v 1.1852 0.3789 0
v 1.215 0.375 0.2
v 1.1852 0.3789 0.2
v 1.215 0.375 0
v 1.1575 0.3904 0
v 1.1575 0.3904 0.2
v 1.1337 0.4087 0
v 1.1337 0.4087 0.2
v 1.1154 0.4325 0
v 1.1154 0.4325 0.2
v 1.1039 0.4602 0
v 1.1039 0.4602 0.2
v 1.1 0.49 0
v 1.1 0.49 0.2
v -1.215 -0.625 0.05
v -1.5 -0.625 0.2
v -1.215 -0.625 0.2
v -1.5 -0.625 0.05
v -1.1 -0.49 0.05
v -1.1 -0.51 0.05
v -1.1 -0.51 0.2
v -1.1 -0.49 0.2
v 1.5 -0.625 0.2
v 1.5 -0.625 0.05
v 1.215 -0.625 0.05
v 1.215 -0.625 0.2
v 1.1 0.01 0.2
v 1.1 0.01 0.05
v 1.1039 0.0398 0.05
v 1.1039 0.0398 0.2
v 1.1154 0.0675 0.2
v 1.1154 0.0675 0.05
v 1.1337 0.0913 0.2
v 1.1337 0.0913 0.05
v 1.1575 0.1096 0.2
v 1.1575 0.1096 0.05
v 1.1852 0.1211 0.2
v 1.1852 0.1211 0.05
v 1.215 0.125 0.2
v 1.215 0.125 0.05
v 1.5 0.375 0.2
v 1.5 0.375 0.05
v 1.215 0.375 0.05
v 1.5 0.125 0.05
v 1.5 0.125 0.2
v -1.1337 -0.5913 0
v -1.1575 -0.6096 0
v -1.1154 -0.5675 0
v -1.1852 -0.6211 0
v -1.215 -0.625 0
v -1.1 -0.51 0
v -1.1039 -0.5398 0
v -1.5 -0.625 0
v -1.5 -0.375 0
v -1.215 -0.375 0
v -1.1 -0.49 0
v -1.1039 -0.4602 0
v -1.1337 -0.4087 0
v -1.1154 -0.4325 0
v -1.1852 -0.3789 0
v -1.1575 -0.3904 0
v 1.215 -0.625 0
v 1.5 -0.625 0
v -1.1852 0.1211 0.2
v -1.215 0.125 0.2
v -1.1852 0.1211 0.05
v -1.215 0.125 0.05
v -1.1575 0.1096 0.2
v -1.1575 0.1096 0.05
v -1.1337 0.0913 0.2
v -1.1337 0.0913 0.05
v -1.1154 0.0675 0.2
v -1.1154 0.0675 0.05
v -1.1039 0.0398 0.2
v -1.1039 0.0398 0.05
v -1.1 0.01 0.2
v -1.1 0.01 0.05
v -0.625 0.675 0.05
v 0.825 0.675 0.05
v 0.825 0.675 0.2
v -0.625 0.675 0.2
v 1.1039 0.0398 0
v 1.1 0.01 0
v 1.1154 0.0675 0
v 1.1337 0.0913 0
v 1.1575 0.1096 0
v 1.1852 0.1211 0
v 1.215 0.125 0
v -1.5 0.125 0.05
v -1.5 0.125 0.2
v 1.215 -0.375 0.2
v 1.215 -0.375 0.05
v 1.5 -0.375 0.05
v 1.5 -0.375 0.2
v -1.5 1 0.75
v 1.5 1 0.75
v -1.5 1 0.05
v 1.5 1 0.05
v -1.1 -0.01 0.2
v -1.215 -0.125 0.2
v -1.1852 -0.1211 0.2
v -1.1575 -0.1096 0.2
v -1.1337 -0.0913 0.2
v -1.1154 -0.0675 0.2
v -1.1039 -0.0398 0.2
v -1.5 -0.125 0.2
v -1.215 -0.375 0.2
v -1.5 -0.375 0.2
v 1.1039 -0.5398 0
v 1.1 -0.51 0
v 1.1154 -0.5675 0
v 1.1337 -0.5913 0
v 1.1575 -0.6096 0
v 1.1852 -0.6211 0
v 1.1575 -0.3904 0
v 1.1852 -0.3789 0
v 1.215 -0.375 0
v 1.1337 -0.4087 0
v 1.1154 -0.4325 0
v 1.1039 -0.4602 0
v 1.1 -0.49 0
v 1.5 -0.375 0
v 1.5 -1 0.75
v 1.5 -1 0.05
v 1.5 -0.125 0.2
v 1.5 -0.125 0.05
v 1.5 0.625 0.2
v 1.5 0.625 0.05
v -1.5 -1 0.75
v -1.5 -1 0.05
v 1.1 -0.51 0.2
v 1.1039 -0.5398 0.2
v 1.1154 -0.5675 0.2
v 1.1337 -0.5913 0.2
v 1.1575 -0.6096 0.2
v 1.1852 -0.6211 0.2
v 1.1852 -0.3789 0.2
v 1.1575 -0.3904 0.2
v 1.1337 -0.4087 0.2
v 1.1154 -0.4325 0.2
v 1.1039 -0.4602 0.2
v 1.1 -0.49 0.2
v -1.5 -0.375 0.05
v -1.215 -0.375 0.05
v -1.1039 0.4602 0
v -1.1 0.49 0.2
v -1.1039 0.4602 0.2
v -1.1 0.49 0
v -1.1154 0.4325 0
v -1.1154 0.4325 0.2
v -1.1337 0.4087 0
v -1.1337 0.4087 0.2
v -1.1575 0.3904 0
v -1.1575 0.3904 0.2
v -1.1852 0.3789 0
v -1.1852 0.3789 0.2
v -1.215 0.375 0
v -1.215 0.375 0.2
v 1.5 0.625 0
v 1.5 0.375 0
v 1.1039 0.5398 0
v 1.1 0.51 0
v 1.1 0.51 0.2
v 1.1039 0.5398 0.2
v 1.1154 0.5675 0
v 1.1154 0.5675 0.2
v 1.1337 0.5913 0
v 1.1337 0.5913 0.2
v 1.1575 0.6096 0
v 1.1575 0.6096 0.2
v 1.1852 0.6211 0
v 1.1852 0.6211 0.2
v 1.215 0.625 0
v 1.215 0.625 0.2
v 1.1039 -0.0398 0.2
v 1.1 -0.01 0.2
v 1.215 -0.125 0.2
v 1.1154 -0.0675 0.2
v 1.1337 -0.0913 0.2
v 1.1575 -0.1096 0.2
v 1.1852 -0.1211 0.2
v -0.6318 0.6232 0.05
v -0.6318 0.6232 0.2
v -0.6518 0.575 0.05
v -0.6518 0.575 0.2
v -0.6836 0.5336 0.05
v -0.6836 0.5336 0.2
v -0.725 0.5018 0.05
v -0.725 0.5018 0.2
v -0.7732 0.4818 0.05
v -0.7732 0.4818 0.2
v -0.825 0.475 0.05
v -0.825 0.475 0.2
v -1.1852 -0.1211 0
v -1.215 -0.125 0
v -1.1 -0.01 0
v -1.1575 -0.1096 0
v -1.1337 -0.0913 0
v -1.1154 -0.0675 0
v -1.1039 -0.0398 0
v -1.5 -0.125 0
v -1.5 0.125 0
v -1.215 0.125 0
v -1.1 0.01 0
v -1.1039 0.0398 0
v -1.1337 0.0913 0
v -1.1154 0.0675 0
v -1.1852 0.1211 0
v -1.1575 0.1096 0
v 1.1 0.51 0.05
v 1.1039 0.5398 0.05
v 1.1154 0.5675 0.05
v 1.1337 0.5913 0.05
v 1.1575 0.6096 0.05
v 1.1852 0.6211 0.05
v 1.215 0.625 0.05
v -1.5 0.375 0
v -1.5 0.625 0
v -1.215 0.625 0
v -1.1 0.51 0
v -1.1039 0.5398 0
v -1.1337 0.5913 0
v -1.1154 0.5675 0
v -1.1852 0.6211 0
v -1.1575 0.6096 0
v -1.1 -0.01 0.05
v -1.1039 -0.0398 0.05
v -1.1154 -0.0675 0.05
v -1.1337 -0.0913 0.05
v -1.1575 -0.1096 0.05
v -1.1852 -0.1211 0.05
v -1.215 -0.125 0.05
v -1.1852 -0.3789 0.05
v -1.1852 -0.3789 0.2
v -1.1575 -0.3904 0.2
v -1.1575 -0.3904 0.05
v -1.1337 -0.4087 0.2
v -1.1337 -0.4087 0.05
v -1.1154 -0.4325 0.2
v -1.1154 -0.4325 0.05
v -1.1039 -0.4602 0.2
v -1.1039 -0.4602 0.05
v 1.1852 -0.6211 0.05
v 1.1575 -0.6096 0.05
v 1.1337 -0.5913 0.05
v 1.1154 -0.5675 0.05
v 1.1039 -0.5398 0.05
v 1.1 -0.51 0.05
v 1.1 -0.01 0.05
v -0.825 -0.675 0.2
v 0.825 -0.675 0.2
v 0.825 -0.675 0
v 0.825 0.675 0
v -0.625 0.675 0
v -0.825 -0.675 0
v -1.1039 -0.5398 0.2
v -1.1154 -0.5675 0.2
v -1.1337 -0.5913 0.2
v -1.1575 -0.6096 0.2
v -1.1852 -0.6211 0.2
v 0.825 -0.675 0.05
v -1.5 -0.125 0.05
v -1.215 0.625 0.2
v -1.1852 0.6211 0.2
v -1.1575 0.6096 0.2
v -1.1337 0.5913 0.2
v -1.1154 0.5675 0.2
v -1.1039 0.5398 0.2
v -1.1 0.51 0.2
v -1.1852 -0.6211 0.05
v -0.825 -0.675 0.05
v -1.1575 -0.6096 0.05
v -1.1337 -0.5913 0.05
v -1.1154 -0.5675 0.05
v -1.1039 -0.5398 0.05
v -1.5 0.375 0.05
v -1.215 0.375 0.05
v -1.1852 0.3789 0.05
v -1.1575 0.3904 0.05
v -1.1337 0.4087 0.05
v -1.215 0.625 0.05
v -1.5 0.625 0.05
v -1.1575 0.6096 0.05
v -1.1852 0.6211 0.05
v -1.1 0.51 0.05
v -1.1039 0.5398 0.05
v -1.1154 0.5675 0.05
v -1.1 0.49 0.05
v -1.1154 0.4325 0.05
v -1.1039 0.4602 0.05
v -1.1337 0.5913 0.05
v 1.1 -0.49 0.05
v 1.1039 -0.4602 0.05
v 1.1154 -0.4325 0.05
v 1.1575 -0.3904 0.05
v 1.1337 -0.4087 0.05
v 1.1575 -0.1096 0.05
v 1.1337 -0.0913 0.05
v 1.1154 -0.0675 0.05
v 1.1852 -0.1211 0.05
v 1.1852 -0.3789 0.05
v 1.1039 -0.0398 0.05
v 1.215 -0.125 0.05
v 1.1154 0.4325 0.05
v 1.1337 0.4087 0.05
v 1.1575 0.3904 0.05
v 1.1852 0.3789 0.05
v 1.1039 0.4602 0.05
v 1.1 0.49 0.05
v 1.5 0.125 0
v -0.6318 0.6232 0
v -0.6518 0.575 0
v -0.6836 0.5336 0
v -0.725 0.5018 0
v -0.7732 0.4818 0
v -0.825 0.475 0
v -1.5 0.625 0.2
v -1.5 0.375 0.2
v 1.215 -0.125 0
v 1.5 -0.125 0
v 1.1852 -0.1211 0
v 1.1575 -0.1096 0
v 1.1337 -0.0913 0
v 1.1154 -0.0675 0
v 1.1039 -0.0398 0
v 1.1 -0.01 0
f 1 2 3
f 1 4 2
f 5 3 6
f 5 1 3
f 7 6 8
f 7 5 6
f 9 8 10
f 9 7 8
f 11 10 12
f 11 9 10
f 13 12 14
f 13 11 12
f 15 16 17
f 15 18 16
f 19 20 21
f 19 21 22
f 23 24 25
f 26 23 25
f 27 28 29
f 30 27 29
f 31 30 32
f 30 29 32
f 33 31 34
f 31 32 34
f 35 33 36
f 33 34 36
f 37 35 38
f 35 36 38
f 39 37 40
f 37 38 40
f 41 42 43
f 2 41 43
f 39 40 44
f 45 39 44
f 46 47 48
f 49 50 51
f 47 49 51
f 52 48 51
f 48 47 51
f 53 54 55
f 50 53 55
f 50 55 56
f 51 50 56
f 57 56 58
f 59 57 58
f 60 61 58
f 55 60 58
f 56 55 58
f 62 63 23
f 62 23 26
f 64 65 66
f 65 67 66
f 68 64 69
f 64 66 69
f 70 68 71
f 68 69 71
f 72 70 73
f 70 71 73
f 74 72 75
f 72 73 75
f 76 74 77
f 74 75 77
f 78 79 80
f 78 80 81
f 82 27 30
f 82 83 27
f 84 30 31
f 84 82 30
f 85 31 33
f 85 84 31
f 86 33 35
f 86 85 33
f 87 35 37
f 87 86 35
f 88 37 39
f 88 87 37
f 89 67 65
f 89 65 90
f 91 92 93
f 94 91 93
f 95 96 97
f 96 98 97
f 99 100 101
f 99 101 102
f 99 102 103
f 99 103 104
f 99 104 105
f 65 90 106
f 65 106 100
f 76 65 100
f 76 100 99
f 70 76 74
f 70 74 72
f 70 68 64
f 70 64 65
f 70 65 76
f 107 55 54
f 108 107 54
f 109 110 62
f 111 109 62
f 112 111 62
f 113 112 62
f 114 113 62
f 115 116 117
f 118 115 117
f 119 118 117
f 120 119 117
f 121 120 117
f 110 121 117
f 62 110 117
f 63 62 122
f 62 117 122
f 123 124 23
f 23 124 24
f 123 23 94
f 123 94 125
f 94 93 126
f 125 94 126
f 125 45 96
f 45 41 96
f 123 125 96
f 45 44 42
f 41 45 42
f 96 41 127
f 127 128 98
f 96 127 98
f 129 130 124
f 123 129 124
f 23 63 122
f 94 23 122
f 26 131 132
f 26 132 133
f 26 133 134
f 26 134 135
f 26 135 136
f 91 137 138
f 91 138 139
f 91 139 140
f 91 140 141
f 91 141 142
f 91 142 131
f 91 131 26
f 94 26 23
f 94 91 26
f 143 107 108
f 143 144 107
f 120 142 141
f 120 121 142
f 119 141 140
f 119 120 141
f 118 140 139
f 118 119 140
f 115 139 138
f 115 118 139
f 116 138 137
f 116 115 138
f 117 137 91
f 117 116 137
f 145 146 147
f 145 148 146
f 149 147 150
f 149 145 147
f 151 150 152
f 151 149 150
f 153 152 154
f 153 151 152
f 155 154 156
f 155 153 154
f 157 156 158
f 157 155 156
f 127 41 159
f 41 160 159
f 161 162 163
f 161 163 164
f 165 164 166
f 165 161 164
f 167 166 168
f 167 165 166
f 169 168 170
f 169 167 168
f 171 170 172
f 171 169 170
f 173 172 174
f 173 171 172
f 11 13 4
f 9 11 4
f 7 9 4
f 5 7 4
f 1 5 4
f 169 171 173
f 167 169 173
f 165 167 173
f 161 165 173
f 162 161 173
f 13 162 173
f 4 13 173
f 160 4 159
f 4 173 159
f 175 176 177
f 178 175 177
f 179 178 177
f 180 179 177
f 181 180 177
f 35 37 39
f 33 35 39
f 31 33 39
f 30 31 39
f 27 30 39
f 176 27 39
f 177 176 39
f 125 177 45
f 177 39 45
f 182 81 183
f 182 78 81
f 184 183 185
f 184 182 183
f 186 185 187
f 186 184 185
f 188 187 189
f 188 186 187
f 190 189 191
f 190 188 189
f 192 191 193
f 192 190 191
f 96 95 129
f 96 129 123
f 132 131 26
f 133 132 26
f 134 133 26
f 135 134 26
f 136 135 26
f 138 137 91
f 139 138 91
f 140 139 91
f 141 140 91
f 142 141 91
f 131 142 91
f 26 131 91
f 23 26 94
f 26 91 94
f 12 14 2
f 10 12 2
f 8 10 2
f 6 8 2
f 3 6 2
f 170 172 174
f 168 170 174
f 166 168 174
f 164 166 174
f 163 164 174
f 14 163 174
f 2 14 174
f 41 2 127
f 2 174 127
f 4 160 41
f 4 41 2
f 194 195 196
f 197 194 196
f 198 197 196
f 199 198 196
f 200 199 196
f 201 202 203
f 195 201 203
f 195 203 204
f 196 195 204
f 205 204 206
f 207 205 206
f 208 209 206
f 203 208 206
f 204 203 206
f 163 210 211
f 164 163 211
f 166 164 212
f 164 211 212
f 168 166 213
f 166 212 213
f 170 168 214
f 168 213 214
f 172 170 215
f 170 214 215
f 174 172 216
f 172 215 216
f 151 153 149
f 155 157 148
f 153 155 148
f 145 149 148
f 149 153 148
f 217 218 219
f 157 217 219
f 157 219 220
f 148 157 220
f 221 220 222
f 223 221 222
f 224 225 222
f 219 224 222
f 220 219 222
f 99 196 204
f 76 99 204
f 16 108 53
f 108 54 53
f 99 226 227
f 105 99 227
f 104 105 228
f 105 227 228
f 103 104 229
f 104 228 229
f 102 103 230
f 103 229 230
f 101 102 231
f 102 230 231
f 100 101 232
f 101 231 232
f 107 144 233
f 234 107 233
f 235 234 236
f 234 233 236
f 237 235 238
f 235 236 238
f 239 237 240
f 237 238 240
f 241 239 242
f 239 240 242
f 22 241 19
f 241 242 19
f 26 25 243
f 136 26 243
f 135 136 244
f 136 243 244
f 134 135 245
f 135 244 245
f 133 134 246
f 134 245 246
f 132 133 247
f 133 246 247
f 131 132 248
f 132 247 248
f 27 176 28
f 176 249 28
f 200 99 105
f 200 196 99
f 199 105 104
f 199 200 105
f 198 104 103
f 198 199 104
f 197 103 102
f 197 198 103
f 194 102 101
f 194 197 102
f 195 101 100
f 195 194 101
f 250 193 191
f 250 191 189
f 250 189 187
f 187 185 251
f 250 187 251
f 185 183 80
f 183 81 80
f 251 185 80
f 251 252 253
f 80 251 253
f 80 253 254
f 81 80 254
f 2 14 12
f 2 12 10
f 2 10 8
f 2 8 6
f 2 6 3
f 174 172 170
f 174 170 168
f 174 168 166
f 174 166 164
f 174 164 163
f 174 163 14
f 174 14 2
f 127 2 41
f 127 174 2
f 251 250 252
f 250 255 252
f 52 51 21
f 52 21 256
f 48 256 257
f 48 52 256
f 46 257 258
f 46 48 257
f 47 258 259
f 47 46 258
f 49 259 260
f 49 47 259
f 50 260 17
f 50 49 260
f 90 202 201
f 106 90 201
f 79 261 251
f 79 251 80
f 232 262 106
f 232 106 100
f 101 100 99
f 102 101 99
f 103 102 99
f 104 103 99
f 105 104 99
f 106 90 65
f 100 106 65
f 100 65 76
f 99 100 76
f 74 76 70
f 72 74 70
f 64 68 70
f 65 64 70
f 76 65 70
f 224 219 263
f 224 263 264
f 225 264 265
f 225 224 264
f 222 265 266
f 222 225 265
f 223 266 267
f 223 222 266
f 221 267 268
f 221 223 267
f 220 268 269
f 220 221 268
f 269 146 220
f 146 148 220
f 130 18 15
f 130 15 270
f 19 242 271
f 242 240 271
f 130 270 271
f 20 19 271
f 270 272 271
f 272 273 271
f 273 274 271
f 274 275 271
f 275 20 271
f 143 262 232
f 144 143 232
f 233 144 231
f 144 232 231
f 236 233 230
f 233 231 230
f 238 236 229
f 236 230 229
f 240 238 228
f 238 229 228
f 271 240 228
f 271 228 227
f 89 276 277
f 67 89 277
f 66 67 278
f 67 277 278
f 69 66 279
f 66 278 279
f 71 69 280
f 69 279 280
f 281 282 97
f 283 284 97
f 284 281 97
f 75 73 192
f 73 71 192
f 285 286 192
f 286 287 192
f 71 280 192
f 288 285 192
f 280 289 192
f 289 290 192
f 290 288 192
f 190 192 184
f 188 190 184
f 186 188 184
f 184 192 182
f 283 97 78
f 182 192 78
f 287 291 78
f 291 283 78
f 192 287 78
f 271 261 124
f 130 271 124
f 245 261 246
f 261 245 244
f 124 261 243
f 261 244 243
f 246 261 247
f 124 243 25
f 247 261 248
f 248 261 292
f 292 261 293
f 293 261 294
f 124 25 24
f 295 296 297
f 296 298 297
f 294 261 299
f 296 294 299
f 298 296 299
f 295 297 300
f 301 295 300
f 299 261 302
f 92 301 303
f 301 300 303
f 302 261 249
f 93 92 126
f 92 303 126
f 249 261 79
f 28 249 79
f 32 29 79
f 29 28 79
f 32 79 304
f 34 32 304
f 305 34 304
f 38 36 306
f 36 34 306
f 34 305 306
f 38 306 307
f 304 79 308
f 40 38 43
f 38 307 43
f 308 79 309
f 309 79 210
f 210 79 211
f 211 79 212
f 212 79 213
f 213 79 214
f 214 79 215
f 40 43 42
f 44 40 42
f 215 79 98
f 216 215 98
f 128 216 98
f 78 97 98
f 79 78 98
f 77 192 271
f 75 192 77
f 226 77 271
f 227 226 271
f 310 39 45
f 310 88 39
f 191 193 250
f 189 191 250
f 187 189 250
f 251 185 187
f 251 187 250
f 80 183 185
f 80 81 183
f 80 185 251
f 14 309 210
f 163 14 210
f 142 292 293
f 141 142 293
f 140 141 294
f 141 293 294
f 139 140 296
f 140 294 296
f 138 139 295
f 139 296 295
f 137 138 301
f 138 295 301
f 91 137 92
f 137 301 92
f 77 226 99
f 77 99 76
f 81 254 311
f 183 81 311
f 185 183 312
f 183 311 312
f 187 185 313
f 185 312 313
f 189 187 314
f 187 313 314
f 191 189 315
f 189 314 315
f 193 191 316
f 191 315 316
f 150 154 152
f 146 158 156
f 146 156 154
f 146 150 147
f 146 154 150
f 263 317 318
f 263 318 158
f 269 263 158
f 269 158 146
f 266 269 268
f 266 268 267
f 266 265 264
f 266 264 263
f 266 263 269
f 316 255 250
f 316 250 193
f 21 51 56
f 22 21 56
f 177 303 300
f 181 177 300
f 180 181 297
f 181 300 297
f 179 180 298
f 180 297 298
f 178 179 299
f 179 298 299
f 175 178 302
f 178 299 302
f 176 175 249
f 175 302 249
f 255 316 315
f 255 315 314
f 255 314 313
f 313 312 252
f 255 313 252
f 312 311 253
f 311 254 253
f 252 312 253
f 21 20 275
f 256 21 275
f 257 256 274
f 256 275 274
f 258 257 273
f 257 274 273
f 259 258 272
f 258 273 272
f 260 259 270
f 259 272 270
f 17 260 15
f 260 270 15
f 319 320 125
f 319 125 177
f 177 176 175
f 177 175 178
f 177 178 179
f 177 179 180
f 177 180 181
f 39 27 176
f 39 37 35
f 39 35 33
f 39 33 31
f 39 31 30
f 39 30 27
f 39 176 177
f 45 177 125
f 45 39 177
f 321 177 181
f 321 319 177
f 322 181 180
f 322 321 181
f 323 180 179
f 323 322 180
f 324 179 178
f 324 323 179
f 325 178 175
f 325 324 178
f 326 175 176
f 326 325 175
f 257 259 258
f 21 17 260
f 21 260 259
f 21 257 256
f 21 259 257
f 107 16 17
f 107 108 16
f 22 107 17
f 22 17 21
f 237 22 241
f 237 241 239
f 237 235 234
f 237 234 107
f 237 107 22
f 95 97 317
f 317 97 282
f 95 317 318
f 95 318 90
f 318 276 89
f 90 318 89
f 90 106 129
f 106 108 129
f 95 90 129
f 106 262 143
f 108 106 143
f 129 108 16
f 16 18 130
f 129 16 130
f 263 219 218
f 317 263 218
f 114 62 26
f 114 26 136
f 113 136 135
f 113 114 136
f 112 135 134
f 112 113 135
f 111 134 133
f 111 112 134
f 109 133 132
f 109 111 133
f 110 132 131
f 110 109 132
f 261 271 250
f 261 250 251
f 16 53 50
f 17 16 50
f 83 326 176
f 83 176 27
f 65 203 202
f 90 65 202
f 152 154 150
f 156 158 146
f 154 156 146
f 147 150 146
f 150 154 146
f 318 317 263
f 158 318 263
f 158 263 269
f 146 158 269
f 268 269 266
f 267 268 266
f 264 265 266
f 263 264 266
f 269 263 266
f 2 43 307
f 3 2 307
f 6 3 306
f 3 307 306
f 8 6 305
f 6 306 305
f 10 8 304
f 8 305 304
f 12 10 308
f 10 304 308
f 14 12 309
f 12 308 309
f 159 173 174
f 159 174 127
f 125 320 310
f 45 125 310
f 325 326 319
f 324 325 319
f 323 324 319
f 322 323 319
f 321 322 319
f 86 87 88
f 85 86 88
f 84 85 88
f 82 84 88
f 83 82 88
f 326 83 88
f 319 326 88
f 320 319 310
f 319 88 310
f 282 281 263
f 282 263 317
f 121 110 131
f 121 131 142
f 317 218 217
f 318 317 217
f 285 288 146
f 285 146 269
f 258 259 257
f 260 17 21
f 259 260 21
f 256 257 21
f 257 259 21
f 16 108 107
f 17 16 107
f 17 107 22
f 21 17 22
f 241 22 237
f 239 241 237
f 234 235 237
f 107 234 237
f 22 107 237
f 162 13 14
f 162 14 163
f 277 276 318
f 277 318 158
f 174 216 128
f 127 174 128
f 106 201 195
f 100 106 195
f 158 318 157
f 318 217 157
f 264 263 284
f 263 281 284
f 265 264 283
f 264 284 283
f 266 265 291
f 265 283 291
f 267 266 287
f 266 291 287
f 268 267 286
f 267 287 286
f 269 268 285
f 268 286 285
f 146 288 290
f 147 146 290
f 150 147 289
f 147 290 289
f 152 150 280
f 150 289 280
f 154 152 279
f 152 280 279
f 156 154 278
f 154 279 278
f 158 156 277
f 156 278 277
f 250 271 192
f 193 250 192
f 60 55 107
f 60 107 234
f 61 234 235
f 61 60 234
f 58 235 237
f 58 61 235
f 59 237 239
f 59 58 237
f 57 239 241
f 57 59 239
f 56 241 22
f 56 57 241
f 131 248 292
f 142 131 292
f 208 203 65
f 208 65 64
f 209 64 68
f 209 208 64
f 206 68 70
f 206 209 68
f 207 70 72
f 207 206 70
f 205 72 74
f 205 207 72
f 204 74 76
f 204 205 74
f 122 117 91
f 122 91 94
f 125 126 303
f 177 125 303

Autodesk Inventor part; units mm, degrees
sketch "Sketch1" plane through (0, 0, 0) normal (0, 0, 1) x (1, 0, 0)
  line L0 (-1.5, -1) -> (1.5, -1)
  line L1 (1.5, -1) -> (1.5, 1)
  line L2 (1.5, 1) -> (-1.5, 1)
  line L3 (-1.5, 1) -> (-1.5, -1)
  line L4 (-1.5, -1) -> (1.5, 1) construction
  line L5 (1.5, -1) -> (-1.5, 1) construction
  line L6 (-1.5, 0.375) -> (-1.215, 0.375)
  line L7 (-1.1, 0.49) -> (-1.1, 0.51)
  line L8 (-1.215, 0.625) -> (-1.5, 0.625)
  line L9 (-1.5, 0.625) -> (-1.5, 0.375)
  line L10 (-1.5, 0.375) -> (-1.1, 0.625) construction
  line L11 (-1.1, 0.375) -> (-1.5, 0.625) construction
  arc A0 (-1.215, 0.375) -> (-1.1, 0.49) centre (-1.215, 0.49) ccw
  arc A1 (-1.1, 0.51) -> (-1.215, 0.625) centre (-1.215, 0.51) ccw
  line L12 (0, 1) -> (0, -1) construction
  line L13 (1.5, 0.375) -> (1.215, 0.375)
  line L14 (1.1, 0.49) -> (1.1, 0.51)
  line L15 (1.215, 0.625) -> (1.5, 0.625)
  line L16 (1.5, 0.625) -> (1.5, 0.375)
  arc A2 (1.1, 0.49) -> (1.215, 0.375) centre (1.215, 0.49) ccw
  arc A3 (1.215, 0.625) -> (1.1, 0.51) centre (1.215, 0.51) ccw
  line L17 (-1.5, 0.125) -> (-1.5, -0.125)
  line L18 (-1.215, 0.125) -> (-1.5, 0.125)
  arc A4 (-1.1, 0.01) -> (-1.215, 0.125) centre (-1.215, 0.01) ccw
  arc A5 (-1.215, -0.125) -> (-1.1, -0.01) centre (-1.215, -0.01) ccw
  line L19 (-1.1, -0.01) -> (-1.1, 0.01)
  line L20 (-1.5, -0.125) -> (-1.215, -0.125)
  line L21 (1.5, 0.125) -> (1.5, -0.125)
  line L22 (1.5, -0.125) -> (1.215, -0.125)
  line L23 (1.215, 0.125) -> (1.5, 0.125)
  arc A6 (1.1, -0.01) -> (1.215, -0.125) centre (1.215, -0.01) ccw
  line L24 (1.1, -0.01) -> (1.1, 0.01)
  arc A7 (1.215, 0.125) -> (1.1, 0.01) centre (1.215, 0.01) ccw
  line L25 (-1.5, -0.375) -> (-1.5, -0.625)
  line L26 (-1.215, -0.375) -> (-1.5, -0.375)
  arc A8 (-1.1, -0.49) -> (-1.215, -0.375) centre (-1.215, -0.49) ccw
  arc A9 (-1.215, -0.625) -> (-1.1, -0.51) centre (-1.215, -0.51) ccw
  line L27 (-1.1, -0.51) -> (-1.1, -0.49)
  line L28 (-1.5, -0.625) -> (-1.215, -0.625)
  line L29 (1.5, -0.375) -> (1.5, -0.625)
  line L30 (1.5, -0.625) -> (1.215, -0.625)
  line L31 (1.215, -0.375) -> (1.5, -0.375)
  arc A10 (1.1, -0.51) -> (1.215, -0.625) centre (1.215, -0.51) ccw
  line L32 (1.1, -0.51) -> (1.1, -0.49)
  arc A11 (1.215, -0.375) -> (1.1, -0.49) centre (1.215, -0.49) ccw
  line L33 (-0.825, -0.675) -> (0.825, -0.675)
  line L34 (0.825, -0.675) -> (0.825, 0.675)
  line L35 (0.825, 0.675) -> (-0.625, 0.675)
  line L36 (-0.825, 0.675) -> (-0.825, -0.675) construction
  line L37 (-0.825, -0.675) -> (0.825, 0.675) construction
  line L38 (0.825, -0.675) -> (-0.825, 0.675) construction
  arc A12 (-0.825, 0.475) -> (-0.625, 0.675) centre (-0.825, 0.675) ccw
  line L39 (-0.825, 0.675) -> (-0.825, 0.55) construction
  line L40 (-0.825, 0.675) -> (-0.625, 0.675) construction
  line L41 (-0.625, 0.675) -> (-0.825, 0.675) construction
  line L42 (-0.825, 0.55) -> (-0.825, 0.475) construction
  line L43 (-0.825, -0.675) -> (-0.825, 0.475)
  point P0 (0, 0)
  point P1 (-1.3, 0.5)
  point P2 (-1.1, 0.125)
  point P3 (-1.1, -0.125)
  point P4 (-1.1, -0.375)
  point P5 (-1.1, -0.625)
  dimension "d0" = 3
  dimension "d1" = 2
  dimension "d2" = 0.4
  dimension "d3" = 0.25
  dimension "d4" = 0.5
  dimension "d5" = 0.115
  dimension "d8" = 0.5
  dimension "d32" = 1.65
  dimension "d33" = 1.35
  dimension "d34" = 0.2
  dimension "d35" = 90
ref_plane "Work Plane1" through (0, 0, 0.75) normal (0, 0, 1) x (1, 0, 0)
ref_plane "Work Plane2" through (0, 0, 0.05) normal (0, 0, 1) x (1, 0, 0)
ref_plane "Work Plane3" through (0, 0, 0.2) normal (0, 0, 1) x (1, 0, 0)
extrude "Extrusion2" add sketch "Sketch1" along normal up to surface (0.55 mm away) from surface at 0.2 contours L3 L28 A9 L27 A8 L26 L20 A5 L19 A4 L18 L6 A0 L7 A1 L8 L2 L1 L15 A3 L14 A2 L13 L23 A7 L24 A6 L22 L31 A11 L32 A10 L30 L0 | L3 L26 A8 L27 A9 L28 | L30 A10 L32 A11 L31 L1 | L3 L18 A4 L19 A5 L20 | L22 A6 L24 A7 L23 L1 | L3 L8 A1 L7 A0 L6 | L13 A2 L14 A3 L15 L1 | L43 A12 L35 L34 L33
extrude "Extrusion3" add sketch "Sketch1" along normal up to surface (0.15 mm away) from surface at 0.05 contours L3 L28 A9 L27 A8 L26 L20 A5 L19 A4 L18 L6 A0 L7 A1 L8 L2 L1 L15 A3 L14 A2 L13 L23 A7 L24 A6 L22 L31 A11 L32 A10 L30 L0
extrude "Extrusion4" add sketch "Sketch1" along normal up to surface (0.2 mm away) from surface at 0 separate body contours L3 L26 A8 L27 A9 L28 | L30 A10 L32 A11 L31 L1 | L3 L18 A4 L19 A5 L20 | L22 A6 L24 A7 L23 L1 | L3 L8 A1 L7 A0 L6 | L13 A2 L14 A3 L15 L1 | L43 A12 L35 L34 L33
properties part number "DFN-6-1EP_3x2mm_P0.5mm_EP1.65x1.35mm"
